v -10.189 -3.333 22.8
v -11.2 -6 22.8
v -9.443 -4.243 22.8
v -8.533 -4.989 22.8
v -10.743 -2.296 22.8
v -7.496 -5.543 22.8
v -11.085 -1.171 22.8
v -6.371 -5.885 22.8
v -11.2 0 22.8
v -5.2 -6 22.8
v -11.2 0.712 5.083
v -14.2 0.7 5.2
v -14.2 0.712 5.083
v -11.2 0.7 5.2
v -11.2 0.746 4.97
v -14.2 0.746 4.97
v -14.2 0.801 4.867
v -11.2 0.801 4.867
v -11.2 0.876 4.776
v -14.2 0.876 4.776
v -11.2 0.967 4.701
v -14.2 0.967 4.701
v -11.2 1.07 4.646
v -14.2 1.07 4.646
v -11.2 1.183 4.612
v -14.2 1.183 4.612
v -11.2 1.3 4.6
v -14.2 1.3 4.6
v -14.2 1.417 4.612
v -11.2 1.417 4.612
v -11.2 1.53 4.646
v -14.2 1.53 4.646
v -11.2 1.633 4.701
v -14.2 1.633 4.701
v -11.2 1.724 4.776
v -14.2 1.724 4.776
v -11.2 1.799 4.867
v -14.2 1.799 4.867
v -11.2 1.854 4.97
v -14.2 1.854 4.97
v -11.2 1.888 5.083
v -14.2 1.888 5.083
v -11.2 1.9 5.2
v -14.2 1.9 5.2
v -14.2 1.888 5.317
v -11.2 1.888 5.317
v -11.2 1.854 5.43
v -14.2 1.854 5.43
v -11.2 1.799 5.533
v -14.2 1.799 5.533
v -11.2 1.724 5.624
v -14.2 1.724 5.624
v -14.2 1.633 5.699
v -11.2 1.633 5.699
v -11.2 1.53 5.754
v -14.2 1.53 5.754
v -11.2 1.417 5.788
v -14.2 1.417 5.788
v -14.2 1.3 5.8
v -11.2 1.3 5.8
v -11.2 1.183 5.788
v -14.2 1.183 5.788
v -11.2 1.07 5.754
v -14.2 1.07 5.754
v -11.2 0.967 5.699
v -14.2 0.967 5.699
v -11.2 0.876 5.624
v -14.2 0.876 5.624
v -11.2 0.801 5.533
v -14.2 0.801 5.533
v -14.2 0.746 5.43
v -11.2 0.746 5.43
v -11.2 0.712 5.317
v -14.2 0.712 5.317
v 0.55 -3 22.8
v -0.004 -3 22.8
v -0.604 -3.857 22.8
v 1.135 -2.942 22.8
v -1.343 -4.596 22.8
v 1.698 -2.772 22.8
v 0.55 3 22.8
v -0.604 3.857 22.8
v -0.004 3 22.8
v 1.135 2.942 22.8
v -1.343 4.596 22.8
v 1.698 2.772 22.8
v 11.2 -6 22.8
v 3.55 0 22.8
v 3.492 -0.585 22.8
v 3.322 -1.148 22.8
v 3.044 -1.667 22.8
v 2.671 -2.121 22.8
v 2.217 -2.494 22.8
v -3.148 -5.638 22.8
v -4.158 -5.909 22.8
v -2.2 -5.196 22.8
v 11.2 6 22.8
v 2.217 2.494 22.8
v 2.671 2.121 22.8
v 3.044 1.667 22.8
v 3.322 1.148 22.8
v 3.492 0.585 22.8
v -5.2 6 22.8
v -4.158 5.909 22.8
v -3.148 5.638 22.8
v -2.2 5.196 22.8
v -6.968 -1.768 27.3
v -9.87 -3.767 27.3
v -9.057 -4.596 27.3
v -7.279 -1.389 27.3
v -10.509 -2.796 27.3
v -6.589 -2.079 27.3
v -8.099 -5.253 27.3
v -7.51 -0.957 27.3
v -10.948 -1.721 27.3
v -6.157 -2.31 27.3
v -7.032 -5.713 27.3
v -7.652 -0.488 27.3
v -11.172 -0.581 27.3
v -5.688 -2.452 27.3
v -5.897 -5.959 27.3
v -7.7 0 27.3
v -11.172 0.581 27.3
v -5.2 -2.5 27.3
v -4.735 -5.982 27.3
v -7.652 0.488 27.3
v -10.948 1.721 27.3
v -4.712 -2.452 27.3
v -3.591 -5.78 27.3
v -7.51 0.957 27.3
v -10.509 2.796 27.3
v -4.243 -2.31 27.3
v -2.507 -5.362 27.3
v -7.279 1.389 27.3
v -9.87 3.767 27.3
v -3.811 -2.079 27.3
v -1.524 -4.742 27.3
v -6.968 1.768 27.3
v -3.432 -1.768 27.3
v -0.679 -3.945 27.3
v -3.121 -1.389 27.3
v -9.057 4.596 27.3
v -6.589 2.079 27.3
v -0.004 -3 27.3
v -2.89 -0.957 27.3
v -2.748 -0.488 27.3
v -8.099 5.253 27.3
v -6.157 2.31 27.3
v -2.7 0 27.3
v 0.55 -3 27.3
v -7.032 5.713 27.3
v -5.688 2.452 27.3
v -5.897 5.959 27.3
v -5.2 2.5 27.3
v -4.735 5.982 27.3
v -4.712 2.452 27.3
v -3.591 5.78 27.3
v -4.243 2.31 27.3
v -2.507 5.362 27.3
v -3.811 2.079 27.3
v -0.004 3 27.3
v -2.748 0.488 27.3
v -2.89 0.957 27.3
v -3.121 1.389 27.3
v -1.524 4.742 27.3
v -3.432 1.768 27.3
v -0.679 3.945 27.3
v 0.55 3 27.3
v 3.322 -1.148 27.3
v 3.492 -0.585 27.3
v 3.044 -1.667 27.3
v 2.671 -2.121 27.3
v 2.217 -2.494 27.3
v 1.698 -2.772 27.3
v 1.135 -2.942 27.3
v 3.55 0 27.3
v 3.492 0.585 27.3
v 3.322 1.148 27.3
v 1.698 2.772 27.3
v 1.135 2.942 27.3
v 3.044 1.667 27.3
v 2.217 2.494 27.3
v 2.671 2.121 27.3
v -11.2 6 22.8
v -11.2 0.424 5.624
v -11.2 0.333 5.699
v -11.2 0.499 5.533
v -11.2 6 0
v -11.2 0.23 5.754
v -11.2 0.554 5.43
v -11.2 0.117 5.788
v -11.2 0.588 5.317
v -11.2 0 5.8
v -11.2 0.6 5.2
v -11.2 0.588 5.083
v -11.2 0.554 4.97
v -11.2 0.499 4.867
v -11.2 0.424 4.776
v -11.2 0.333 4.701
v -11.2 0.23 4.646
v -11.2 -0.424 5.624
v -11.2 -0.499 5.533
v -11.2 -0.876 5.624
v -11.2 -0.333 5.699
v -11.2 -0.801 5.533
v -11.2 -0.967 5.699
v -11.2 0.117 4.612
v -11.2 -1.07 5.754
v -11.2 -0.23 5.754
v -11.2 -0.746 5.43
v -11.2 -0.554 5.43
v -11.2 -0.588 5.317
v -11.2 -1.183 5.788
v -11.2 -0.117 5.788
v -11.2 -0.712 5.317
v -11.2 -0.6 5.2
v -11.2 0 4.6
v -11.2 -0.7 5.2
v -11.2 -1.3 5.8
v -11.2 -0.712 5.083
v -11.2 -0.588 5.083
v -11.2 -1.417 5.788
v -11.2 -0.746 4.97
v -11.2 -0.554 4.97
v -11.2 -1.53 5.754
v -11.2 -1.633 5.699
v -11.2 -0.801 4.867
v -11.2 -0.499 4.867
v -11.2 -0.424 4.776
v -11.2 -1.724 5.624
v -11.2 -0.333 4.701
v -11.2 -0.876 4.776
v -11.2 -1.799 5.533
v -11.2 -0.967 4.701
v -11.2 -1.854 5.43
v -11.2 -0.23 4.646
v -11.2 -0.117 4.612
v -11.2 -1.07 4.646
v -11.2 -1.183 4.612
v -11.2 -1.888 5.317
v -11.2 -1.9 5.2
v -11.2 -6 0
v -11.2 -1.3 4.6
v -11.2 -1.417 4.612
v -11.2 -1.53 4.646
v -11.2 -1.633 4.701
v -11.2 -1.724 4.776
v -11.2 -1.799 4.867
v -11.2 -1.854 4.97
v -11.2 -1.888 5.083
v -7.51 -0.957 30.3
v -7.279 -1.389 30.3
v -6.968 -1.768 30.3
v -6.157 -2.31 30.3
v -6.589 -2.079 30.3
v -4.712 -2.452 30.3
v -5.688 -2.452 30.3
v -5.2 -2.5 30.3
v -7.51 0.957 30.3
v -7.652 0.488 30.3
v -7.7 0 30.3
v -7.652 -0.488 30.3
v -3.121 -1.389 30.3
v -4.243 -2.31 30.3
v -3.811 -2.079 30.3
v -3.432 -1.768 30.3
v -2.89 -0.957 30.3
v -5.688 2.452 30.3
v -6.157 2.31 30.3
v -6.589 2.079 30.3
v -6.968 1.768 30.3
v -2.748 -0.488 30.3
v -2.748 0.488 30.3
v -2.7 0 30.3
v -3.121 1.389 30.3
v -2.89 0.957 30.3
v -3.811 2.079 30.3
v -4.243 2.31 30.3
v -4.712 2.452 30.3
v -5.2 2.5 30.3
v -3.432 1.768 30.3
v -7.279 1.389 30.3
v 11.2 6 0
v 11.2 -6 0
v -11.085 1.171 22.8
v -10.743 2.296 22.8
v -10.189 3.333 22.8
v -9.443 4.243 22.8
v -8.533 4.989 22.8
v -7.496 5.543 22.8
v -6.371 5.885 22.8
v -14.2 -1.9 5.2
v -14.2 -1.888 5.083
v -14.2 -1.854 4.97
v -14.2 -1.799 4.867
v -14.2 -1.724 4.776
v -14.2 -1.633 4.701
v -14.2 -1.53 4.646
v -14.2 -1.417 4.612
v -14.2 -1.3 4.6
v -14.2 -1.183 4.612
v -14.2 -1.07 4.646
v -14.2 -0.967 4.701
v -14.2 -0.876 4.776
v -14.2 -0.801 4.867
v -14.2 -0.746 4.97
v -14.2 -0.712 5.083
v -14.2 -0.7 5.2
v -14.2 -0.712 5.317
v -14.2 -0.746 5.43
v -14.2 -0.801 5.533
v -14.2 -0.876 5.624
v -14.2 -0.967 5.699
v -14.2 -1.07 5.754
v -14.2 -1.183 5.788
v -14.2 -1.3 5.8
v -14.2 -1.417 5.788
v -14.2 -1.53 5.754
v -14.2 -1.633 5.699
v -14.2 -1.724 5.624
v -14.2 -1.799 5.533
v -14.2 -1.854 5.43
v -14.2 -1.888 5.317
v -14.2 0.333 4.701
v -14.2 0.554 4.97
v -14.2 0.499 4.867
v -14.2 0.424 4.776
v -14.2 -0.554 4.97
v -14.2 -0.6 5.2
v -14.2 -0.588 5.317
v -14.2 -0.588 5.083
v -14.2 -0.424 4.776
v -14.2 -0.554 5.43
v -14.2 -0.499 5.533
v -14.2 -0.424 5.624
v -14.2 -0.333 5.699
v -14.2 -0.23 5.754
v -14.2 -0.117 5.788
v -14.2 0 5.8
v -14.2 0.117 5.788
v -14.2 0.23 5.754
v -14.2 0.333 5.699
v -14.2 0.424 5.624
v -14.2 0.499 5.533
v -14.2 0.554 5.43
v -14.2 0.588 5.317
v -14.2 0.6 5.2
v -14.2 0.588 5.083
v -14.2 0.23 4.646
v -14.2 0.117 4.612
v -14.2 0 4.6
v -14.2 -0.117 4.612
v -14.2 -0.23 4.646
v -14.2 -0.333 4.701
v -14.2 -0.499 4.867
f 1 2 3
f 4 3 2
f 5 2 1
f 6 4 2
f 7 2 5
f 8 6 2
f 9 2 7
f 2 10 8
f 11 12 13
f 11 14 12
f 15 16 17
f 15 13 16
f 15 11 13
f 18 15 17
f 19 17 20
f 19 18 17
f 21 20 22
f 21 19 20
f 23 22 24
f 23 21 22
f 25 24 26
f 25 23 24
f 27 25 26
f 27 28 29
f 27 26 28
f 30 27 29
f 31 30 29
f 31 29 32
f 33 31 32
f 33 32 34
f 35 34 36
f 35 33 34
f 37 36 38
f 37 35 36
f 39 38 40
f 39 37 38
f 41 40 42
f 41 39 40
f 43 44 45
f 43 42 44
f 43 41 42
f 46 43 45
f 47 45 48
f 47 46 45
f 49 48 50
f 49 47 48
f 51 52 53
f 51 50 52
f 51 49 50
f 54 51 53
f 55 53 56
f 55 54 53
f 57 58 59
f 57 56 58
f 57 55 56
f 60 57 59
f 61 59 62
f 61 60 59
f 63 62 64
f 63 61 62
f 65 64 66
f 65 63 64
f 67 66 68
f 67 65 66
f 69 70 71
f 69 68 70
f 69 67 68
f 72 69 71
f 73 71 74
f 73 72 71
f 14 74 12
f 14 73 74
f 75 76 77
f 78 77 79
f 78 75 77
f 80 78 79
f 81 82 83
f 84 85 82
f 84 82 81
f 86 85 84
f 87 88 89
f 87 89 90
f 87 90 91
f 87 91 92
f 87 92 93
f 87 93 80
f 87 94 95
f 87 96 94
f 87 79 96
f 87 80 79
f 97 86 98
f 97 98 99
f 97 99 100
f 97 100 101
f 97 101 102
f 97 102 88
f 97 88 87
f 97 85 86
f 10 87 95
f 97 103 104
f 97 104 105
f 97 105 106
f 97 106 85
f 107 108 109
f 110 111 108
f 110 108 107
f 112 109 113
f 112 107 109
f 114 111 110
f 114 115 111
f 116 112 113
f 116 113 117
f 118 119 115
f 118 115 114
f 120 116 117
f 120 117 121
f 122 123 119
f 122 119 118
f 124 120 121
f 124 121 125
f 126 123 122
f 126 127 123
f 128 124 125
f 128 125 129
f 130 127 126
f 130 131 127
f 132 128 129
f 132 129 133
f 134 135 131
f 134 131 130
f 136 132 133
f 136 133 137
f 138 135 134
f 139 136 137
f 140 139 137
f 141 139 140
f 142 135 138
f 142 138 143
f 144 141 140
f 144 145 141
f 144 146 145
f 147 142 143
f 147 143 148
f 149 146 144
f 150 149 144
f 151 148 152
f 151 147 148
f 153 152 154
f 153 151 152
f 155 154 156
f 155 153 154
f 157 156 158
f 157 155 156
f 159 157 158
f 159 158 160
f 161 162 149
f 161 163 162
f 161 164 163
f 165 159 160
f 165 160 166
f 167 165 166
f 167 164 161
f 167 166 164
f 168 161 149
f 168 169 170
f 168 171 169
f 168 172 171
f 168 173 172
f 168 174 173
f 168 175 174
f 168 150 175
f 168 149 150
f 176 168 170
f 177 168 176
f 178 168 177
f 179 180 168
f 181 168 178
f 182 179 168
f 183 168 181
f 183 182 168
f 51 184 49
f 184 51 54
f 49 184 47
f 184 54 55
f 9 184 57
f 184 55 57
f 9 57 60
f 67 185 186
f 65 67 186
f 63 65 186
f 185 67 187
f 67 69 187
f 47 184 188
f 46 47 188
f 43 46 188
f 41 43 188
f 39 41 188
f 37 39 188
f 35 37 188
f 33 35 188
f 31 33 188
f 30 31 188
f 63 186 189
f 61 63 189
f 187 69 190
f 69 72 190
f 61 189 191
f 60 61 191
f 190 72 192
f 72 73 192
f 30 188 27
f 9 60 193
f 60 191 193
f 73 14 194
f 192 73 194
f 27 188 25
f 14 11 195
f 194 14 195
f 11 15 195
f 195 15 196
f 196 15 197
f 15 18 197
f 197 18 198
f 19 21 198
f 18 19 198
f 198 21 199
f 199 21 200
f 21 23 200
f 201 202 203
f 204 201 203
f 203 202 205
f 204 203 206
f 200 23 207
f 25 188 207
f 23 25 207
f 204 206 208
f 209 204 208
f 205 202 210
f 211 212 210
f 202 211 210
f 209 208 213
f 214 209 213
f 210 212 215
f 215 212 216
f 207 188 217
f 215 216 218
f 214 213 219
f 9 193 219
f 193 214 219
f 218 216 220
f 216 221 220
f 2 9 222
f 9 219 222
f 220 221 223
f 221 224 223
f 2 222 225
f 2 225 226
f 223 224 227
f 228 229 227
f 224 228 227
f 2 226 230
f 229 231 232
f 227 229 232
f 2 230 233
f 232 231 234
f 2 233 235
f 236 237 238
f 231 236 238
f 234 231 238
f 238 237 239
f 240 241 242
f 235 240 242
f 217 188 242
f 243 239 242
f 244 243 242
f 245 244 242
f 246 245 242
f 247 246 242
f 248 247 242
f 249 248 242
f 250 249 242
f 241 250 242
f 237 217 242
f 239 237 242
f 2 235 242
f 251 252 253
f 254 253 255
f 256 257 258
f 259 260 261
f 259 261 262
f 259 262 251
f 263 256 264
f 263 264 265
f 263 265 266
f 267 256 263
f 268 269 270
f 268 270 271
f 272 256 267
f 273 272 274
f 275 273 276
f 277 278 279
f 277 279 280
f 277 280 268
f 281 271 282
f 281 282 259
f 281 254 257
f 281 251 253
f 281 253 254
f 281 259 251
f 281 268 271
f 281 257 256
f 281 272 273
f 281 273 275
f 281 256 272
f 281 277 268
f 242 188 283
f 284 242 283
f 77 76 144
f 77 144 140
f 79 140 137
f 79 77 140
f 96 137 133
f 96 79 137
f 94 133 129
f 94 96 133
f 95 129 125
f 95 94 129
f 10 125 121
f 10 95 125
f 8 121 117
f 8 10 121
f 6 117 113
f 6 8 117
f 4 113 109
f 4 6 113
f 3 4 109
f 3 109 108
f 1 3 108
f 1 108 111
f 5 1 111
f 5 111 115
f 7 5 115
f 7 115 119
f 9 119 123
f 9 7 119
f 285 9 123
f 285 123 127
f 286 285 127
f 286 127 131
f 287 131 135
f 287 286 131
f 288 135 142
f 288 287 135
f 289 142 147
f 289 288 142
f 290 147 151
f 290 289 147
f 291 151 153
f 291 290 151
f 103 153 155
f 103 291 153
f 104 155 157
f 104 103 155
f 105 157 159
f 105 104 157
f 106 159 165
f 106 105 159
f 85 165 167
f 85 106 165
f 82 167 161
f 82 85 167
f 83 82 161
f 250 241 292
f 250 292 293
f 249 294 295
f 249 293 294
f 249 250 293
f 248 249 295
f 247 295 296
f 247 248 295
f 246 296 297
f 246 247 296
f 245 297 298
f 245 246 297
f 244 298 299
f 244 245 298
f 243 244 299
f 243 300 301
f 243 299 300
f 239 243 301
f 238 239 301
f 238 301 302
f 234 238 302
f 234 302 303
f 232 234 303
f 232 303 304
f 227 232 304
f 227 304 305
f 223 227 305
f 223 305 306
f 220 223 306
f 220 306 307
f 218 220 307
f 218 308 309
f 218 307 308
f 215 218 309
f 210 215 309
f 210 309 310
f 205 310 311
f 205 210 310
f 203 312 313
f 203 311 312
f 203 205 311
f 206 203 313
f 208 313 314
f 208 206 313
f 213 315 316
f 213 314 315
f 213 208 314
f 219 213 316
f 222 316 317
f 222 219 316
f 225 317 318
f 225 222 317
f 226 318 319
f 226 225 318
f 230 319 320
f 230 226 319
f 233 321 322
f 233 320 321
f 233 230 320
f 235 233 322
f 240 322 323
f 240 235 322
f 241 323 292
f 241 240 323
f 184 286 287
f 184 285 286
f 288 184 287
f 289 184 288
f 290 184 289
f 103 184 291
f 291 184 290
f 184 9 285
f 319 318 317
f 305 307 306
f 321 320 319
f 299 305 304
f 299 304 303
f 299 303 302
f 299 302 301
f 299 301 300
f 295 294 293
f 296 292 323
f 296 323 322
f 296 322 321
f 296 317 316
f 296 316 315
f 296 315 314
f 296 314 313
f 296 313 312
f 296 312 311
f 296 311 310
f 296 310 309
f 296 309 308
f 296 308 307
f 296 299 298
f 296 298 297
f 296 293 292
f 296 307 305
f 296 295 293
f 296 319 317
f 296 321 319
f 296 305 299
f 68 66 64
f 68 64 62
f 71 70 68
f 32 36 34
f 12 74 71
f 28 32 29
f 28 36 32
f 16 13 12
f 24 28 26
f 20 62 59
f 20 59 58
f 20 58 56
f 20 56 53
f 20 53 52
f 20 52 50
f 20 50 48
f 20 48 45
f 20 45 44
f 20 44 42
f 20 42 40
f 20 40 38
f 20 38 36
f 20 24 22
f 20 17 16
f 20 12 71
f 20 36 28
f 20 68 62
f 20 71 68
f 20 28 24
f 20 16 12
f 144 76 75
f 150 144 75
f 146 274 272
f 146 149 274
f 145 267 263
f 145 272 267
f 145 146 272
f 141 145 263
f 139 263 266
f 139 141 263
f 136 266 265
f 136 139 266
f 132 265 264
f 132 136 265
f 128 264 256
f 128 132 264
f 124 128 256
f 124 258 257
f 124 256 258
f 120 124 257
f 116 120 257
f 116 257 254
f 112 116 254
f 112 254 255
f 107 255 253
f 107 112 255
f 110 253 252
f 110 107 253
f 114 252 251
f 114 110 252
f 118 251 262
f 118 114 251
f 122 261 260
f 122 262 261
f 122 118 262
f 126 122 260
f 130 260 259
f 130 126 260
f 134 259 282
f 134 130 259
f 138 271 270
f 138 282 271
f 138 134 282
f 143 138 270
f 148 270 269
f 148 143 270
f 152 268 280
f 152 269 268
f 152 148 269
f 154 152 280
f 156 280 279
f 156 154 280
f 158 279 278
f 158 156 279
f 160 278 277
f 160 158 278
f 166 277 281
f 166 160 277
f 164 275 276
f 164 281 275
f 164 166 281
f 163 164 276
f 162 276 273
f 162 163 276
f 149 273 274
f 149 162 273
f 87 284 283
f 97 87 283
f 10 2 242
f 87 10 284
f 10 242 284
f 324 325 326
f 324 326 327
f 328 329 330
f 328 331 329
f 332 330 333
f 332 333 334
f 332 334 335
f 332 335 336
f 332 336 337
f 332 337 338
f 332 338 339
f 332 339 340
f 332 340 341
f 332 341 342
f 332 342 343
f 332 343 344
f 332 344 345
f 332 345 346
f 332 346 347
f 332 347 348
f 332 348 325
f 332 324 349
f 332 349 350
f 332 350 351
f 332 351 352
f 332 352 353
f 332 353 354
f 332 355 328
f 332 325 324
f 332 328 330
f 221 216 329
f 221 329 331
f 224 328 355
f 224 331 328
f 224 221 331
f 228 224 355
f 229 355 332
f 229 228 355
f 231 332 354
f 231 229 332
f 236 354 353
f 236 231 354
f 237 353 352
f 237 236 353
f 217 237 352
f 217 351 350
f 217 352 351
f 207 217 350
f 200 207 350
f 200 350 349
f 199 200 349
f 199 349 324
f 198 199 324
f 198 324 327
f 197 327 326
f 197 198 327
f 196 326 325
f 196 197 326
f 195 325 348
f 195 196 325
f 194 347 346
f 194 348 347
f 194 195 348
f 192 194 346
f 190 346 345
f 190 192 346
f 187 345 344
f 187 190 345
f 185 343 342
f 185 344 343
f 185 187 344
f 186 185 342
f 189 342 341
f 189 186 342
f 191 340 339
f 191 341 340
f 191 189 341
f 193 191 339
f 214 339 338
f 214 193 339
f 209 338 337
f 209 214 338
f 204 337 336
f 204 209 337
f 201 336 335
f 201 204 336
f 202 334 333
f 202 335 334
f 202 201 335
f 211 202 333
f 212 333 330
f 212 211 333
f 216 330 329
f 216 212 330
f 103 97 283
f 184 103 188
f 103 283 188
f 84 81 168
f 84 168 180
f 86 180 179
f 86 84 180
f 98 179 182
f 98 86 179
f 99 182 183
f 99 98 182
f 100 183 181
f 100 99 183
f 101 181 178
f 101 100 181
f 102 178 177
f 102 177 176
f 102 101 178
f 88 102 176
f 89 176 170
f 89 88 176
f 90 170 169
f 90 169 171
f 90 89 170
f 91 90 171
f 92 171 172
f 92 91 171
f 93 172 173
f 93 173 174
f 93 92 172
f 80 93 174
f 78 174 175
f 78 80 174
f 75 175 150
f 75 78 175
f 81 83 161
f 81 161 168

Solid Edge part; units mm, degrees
sketch "Sketch1" plane through (0, 0, 0) normal (0, 0, 1) x (1, 0, 0)
  line L0 (-11.2, -6) -> (11.2, -6)
  line L1 (11.2, -6) -> (11.2, 6)
  line L2 (11.2, 6) -> (-11.2, 6)
  line L3 (-11.2, 6) -> (-11.2, -6)
  dimension "D1" = 12
  dimension "D2" = 22.4
extrude "Protrusion1" add sketch "Sketch1" along normal blind 22.8
sketch "Sketch2" plane through (0, 0, 22.8) normal (0, 0, 1) x (1, 0, 0)
  arc A0 (-0.0038, 3) -> (-0.0038, -3) centre (-5.2, 0) ccw
  line L0 (-0.0038, -3) -> (0.55, -3)
  arc A1 (0.55, 3) -> (0.55, -3) centre (0.55, 0) cw
  line L1 (-0.0038, 3) -> (0.55, 3)
  dimension "D1" = 6
  dimension "D2" = 14.75
extrude "Extrusionsausprägung_2" add sketch "Sketch2" along normal blind 4.5
sketch "Sketch3" plane through (-4.025, 0, 27.3) normal (0, 0, 1) x (1, 0, 0)
  circle A0 centre (-1.175, 0) radius 2.5
  dimension "D1" = 5
extrude "Extrusionsausprägung_3" add sketch "Sketch3" along normal blind 3
sketch "Sketch4" plane through (-11.2, 0, 11.2) normal (-1, 0, 0) x (0, -1, 0)
  circle A0 centre (0, -6) radius 0.6
  circle A1 centre (1.3, -6) radius 0.6
  circle A2 centre (-1.3, -6) radius 0.6
  dimension "D1" = 5.2
  dimension "D2" = 1.2
  dimension "D3" = 1.3
extrude "Extrusionsausprägung_4" add sketch "Sketch4" along normal blind 3
